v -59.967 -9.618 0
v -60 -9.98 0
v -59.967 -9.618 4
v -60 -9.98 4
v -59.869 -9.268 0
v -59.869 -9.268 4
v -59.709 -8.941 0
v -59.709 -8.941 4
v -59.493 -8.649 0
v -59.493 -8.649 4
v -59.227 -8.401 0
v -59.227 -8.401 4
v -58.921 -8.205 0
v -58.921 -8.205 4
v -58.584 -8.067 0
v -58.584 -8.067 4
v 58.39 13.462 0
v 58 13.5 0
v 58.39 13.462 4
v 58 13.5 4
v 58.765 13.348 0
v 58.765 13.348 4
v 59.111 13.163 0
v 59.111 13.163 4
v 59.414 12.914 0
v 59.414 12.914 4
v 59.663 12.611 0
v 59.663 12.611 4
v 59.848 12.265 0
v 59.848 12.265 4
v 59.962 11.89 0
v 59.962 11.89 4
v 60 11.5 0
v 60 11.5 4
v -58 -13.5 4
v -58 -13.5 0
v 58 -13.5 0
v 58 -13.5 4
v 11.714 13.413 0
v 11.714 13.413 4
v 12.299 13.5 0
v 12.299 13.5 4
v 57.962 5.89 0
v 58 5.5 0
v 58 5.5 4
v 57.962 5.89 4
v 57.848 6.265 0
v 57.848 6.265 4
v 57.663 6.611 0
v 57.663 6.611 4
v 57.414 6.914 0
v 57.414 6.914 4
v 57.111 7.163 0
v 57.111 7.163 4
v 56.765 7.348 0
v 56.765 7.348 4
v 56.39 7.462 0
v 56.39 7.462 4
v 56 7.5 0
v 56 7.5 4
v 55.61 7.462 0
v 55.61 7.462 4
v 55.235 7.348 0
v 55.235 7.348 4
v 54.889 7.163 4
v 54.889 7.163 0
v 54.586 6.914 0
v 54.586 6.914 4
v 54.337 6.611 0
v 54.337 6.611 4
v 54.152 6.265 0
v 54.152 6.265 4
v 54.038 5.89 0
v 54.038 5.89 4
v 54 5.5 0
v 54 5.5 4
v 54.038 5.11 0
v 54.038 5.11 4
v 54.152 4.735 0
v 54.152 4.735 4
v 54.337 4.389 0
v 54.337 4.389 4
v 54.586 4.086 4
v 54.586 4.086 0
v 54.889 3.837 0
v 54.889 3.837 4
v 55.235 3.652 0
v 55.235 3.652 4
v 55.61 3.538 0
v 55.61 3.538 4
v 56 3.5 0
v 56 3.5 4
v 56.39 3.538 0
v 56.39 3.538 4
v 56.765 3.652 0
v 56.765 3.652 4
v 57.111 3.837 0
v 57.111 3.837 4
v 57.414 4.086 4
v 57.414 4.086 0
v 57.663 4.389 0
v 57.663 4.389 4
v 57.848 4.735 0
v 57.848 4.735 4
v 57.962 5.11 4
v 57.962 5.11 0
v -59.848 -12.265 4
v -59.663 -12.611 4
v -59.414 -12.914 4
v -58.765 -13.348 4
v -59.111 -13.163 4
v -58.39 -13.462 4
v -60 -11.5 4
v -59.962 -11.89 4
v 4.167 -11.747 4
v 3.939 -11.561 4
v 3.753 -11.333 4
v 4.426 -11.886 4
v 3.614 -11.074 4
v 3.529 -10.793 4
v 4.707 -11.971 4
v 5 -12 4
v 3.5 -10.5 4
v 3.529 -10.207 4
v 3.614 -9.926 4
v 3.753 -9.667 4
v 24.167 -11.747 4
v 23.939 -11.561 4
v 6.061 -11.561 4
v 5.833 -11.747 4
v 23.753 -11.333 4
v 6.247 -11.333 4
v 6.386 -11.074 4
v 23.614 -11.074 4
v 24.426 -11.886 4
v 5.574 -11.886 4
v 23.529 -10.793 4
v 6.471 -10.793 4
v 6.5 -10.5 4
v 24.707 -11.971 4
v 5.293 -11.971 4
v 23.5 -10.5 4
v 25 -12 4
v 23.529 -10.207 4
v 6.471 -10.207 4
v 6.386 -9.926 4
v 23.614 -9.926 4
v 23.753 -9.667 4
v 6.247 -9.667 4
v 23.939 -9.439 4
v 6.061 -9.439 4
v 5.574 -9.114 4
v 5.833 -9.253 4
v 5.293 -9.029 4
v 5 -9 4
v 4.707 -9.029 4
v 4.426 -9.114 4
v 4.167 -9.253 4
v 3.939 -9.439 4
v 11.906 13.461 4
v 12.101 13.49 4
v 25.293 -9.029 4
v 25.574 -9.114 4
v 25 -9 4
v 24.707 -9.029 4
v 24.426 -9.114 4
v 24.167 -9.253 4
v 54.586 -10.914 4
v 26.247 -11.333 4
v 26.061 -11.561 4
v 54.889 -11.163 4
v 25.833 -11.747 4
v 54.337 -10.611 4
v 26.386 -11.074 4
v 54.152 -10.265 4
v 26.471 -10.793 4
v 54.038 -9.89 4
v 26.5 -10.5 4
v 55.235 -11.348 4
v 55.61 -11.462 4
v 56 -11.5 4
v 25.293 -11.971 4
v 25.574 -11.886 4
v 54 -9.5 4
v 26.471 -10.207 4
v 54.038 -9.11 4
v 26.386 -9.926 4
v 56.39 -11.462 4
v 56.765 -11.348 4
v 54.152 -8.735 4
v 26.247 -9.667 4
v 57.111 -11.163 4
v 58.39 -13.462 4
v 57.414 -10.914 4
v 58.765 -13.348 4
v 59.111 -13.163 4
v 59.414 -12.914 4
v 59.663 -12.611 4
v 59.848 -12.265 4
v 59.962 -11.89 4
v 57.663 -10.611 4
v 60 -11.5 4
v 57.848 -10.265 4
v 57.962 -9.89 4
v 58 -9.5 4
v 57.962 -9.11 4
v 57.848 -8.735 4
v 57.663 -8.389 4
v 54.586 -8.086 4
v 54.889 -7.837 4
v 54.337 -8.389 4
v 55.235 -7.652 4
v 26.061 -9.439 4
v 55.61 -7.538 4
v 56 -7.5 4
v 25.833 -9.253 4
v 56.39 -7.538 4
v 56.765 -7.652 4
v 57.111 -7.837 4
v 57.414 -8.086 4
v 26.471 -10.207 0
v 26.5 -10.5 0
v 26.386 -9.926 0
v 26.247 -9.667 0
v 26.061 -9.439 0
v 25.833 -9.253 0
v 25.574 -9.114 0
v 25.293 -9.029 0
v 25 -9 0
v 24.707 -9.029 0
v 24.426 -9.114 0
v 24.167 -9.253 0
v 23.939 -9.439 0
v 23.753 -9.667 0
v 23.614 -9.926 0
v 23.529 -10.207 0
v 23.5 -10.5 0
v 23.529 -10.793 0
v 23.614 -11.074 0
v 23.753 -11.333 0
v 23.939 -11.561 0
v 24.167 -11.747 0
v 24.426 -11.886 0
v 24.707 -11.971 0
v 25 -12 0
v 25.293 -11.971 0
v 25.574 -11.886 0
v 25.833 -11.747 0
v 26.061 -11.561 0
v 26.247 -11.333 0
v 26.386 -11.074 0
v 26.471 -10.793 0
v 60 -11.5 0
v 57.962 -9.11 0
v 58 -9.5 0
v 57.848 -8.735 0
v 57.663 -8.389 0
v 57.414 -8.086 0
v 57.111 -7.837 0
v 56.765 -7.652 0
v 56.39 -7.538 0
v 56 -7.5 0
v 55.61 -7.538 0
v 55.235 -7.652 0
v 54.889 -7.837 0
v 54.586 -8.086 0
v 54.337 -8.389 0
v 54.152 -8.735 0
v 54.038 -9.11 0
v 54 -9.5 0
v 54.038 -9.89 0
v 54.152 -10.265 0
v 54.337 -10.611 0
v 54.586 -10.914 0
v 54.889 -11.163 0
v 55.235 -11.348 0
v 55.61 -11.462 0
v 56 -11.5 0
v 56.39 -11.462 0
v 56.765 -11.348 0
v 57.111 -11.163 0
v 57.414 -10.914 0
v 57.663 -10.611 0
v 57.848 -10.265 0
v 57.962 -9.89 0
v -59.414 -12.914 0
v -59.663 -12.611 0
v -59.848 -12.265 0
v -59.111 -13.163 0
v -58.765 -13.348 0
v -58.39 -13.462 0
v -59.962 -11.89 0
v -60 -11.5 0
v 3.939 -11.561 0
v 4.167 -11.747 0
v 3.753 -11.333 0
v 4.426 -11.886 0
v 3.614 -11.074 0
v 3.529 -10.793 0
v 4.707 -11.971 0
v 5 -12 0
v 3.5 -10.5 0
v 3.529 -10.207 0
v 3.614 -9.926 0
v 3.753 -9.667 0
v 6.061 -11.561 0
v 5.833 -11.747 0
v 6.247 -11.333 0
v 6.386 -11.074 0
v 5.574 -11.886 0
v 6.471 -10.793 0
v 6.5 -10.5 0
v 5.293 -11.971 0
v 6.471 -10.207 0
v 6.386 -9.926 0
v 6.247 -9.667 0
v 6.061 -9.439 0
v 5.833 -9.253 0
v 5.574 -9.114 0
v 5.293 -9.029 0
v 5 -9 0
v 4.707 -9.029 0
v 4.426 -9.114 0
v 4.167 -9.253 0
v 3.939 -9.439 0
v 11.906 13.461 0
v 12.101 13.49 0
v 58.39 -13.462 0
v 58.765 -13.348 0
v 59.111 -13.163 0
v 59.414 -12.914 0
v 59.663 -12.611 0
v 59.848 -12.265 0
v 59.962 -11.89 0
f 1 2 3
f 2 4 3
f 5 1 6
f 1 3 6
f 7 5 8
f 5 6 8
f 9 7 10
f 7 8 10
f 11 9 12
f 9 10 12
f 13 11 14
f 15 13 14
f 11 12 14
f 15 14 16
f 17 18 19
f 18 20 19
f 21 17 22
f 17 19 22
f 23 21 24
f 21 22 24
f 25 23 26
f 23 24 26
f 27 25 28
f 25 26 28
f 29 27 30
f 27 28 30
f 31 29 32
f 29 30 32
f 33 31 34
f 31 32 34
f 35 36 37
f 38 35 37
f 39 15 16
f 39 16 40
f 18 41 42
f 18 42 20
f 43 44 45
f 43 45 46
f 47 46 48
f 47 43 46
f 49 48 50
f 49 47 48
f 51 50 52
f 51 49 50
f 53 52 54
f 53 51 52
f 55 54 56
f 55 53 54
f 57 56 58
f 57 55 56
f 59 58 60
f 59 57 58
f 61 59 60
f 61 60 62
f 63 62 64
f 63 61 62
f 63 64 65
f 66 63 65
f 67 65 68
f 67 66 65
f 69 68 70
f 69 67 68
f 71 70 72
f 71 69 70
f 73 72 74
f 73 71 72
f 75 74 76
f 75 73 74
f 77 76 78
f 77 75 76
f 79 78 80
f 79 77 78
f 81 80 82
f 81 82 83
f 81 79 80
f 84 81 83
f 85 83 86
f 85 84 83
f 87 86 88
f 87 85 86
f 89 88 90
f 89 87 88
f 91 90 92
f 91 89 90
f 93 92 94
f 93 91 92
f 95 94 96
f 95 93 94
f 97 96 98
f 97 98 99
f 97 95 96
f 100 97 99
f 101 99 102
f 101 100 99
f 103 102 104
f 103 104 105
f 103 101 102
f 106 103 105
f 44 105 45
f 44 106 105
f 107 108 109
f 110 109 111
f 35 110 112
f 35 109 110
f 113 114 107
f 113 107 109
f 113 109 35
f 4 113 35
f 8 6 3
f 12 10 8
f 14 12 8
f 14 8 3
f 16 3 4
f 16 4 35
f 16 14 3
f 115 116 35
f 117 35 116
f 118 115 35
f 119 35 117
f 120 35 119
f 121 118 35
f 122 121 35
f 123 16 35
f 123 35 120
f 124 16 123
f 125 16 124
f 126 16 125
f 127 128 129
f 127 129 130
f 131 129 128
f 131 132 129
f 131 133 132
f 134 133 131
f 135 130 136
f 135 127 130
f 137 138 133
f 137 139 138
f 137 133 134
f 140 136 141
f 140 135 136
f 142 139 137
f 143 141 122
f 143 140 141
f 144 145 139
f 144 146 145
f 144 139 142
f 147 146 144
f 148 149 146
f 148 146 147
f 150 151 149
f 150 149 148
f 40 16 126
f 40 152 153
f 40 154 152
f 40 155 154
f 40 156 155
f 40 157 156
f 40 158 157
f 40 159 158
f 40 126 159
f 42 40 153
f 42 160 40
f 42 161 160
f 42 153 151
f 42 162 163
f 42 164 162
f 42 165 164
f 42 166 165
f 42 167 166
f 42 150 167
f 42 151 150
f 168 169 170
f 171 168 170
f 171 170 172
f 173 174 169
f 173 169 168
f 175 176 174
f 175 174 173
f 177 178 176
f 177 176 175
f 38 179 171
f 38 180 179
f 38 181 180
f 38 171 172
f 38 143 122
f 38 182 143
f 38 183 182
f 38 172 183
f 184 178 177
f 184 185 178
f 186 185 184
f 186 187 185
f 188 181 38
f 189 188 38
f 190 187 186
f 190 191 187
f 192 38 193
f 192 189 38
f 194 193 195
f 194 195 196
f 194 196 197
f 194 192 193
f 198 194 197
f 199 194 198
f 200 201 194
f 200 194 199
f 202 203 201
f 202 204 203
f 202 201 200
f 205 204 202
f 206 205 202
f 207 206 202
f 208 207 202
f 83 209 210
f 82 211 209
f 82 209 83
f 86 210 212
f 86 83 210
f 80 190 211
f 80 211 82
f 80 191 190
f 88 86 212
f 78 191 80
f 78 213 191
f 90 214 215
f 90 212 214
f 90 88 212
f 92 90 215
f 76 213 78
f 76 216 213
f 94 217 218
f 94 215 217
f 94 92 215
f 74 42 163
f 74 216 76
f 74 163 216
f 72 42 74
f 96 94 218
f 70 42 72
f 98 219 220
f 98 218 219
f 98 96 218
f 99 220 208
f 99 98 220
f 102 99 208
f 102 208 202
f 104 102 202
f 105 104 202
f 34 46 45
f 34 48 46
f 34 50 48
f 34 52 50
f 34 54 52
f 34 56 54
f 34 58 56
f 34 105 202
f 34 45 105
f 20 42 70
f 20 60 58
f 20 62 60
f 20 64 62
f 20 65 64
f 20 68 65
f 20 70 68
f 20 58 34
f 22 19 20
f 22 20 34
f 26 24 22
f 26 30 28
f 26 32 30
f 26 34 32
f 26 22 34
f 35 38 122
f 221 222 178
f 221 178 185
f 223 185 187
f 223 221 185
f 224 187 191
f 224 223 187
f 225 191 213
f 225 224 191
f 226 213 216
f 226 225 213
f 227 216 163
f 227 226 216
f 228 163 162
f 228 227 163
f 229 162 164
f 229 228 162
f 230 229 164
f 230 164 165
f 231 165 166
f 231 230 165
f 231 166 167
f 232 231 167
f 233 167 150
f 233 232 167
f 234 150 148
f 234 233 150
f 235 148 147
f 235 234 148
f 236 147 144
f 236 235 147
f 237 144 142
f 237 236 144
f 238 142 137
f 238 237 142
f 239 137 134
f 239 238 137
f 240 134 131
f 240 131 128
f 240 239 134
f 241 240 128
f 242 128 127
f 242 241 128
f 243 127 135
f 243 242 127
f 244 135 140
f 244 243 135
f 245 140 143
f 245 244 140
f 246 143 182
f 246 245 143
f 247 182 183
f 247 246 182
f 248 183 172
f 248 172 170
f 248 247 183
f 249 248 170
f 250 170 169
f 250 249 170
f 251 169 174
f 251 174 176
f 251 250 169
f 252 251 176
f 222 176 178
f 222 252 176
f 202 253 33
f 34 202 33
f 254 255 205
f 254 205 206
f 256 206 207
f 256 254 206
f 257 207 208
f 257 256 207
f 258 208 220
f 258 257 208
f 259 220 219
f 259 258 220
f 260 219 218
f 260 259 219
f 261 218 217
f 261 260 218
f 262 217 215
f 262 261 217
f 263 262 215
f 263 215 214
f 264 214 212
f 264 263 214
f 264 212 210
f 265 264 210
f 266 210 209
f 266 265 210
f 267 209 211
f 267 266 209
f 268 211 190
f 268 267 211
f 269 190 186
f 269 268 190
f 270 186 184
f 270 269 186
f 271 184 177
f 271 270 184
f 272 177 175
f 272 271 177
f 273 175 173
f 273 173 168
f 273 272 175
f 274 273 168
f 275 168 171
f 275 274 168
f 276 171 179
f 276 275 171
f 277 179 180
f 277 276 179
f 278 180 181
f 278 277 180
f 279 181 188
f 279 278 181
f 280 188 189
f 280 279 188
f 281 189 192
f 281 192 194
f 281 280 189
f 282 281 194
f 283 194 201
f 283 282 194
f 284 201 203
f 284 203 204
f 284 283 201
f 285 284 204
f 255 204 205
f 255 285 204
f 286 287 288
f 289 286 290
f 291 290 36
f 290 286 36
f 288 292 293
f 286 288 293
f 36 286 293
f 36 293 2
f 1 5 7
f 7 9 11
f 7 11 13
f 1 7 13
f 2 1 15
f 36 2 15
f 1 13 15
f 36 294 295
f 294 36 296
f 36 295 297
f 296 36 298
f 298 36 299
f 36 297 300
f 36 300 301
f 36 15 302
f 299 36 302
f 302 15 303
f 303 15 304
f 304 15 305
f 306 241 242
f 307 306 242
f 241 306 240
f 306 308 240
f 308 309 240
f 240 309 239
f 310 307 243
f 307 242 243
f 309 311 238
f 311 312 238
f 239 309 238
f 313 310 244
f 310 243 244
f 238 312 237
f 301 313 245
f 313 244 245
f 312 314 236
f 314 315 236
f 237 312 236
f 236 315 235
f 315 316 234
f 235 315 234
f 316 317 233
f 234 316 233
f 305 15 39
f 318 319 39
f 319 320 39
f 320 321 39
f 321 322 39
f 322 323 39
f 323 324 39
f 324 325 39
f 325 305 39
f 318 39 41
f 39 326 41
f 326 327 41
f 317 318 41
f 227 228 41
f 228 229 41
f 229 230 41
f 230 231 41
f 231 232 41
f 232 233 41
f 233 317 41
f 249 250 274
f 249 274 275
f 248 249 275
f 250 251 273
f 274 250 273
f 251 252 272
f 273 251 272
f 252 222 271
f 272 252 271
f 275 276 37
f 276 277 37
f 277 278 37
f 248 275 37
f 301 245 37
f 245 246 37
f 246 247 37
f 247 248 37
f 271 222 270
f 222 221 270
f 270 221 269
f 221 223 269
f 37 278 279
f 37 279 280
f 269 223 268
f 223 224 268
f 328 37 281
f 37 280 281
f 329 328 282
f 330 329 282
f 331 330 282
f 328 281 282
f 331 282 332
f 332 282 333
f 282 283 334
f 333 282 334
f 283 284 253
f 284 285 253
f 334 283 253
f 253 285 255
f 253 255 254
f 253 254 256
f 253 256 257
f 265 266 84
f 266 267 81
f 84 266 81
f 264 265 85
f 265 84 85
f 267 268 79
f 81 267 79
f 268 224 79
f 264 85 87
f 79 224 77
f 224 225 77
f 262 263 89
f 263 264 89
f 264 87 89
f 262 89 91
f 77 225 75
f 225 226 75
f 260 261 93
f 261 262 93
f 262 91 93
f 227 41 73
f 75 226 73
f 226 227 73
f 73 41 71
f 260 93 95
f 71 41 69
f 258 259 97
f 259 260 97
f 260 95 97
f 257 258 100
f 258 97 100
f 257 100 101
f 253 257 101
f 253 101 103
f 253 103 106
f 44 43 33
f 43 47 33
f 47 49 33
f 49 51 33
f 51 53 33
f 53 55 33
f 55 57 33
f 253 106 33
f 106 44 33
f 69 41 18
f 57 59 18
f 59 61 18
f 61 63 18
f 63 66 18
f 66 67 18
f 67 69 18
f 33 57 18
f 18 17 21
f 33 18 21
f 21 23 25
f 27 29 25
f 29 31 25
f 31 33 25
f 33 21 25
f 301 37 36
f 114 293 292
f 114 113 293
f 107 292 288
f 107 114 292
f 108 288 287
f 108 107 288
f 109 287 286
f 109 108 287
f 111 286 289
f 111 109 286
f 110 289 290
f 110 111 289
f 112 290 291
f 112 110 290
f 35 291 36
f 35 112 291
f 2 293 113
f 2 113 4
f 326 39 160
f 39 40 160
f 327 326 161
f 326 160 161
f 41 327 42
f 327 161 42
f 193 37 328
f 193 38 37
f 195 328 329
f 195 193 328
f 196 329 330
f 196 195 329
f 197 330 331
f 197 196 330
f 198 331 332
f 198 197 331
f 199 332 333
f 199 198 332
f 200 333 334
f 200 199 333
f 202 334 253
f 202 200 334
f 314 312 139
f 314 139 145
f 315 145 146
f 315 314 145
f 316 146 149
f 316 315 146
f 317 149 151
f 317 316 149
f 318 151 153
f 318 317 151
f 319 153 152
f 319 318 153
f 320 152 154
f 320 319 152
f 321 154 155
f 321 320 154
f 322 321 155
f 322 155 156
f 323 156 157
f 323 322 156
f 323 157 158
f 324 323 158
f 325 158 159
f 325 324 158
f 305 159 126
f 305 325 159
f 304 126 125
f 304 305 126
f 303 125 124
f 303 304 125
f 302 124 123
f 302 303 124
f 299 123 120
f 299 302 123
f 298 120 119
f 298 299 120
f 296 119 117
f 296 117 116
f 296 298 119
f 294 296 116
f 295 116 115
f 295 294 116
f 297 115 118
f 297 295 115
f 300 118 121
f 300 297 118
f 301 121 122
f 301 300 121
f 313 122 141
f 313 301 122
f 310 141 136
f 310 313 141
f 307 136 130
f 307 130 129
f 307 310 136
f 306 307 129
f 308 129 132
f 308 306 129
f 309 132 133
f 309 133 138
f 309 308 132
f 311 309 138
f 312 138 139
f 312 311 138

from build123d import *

# Parameters (mm, degrees)
SKETCH_1_W          = 120
SKETCH_1_H          = 27
SKETCH_1_R          = 2
SKETCH_1_R_2        = 1.5
EXTRUDE_1_DEPTH     = 4
CUT_EXTRUDE_1_DEPTH = 10
FILLET_1_R          = 2


with BuildPart() as part:
    # 草图1 → 凸台-拉伸1 (new body)
    with BuildSketch(Plane.XY):
        Rectangle(SKETCH_1_W, SKETCH_1_H)
        with Locations((56, 5.5)):
            Circle(SKETCH_1_R, mode=Mode.SUBTRACT)
        with Locations((56, -9.5)):
            Circle(SKETCH_1_R, mode=Mode.SUBTRACT)
        with Locations((25, -10.5)):
            Circle(SKETCH_1_R_2, mode=Mode.SUBTRACT)
        with Locations((5, -10.5)):
            Circle(SKETCH_1_R_2, mode=Mode.SUBTRACT)
    extrude(amount=EXTRUDE_1_DEPTH)

    # 草图2 → 切除-拉伸1 (cut)
    with BuildSketch(Plane(origin=(0, 0, 0), x_dir=(-1, 0, 0), z_dir=(0, 0, -1))):
        Polygon((60, -8.5), (-12, 13.5), (60, 13.5), align=None)
    extrude(amount=-CUT_EXTRUDE_1_DEPTH, mode=Mode.SUBTRACT)

    # 圆角1
    fillet_1_edges = [part.edges().sort_by_distance(p)[0] for p in [
        (-60, -8.5, 2),
        (12, 13.5, 2),
        (60, -13.5, 2),
        (-60, -13.5, 2),
        (60, 13.5, 2),
    ]]
    fillet(fillet_1_edges, radius=FILLET_1_R)


solid = part.part
